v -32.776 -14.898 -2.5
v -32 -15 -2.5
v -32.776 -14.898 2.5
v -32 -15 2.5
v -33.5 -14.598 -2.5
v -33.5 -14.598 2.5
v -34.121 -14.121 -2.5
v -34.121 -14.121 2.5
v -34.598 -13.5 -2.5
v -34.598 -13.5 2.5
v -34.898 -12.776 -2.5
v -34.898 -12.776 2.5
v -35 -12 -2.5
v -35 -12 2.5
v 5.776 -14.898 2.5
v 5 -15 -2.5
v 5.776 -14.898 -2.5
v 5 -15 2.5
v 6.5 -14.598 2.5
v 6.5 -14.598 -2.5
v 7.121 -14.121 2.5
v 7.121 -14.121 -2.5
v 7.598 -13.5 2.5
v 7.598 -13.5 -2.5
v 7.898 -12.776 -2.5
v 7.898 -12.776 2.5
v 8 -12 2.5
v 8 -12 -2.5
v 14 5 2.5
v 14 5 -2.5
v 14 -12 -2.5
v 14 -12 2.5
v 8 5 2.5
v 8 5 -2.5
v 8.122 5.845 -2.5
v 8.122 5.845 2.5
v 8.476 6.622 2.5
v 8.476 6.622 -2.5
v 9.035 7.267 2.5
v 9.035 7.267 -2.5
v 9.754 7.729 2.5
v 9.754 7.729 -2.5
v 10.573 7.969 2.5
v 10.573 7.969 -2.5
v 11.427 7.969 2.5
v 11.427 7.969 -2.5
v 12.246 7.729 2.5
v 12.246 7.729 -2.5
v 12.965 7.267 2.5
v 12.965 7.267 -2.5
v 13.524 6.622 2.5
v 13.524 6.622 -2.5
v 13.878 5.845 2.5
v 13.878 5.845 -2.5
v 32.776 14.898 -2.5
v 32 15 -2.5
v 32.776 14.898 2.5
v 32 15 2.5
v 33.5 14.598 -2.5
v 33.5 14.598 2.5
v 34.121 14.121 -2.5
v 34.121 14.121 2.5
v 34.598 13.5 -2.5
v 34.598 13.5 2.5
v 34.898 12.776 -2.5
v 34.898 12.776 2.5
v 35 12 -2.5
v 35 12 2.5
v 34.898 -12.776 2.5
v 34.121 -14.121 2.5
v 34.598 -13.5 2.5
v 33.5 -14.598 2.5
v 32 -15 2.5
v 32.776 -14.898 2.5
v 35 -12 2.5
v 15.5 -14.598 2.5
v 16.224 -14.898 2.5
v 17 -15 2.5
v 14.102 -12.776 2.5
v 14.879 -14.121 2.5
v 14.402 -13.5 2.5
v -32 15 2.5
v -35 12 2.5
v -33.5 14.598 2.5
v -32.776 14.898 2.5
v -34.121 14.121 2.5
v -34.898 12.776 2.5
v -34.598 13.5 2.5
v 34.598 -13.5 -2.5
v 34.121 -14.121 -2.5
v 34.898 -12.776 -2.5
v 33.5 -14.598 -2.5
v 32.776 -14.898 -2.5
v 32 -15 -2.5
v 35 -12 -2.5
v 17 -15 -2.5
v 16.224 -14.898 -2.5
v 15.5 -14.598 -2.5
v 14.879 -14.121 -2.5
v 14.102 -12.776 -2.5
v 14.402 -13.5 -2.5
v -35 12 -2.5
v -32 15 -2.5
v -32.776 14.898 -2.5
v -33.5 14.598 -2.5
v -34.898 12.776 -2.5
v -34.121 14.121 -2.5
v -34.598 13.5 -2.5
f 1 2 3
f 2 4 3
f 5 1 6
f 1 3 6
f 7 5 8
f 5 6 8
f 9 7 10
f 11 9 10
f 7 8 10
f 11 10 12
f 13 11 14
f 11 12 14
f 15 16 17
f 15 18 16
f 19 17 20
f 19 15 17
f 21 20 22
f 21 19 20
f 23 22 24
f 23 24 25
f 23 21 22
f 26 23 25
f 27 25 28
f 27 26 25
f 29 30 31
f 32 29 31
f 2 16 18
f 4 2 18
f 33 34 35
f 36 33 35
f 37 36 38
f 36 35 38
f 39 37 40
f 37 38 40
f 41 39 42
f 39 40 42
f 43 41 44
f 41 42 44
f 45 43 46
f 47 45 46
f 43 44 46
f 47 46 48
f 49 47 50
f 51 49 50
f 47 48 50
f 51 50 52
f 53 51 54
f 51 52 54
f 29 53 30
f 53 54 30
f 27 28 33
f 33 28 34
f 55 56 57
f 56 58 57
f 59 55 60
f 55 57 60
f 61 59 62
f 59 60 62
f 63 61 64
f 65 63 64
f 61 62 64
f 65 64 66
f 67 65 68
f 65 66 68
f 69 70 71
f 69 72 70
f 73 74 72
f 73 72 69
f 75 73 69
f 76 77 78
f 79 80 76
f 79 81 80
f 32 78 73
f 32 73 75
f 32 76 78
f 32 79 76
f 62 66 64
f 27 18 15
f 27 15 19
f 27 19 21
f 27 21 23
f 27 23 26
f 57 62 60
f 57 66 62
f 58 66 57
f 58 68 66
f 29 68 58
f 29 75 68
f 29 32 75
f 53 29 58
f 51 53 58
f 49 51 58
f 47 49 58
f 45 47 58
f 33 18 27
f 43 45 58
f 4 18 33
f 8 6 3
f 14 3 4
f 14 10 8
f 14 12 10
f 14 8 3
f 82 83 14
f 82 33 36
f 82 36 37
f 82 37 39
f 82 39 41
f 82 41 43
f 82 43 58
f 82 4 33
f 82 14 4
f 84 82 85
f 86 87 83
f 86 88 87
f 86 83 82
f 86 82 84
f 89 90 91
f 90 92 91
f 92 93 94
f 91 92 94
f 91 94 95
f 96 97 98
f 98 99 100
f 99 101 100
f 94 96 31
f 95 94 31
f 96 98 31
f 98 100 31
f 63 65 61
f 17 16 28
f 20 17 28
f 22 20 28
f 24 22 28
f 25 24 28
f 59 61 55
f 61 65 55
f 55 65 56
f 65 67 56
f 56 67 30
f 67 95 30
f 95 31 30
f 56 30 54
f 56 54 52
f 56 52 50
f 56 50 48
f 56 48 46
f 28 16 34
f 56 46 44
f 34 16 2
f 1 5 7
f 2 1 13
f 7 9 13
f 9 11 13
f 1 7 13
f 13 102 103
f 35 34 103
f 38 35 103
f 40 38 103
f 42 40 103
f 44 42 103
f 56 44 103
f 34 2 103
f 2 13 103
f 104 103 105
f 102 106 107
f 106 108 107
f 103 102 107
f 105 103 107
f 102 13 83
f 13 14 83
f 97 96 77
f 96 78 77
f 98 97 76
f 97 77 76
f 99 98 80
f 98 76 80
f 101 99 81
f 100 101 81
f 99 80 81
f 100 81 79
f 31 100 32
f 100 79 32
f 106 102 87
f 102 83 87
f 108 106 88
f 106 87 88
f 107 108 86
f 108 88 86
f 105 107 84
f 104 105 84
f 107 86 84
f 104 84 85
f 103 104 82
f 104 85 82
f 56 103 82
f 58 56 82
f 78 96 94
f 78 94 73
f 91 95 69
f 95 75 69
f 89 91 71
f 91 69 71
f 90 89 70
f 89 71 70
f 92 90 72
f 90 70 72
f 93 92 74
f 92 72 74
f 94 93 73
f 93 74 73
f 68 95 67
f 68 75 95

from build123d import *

# Parameters (mm, degrees)
PLAT_W                      = 30
PLAT_H                      = 5
EL_MENT_M_CANO_SOUD_1_DEPTH = 70
ENL_V_MAT_EXTRU_1_DEPTH     = 6
CONG_1_R                    = 3


with BuildPart() as part:
    # plat → Elément mécano-soudé1 (new body)
    with BuildSketch(Plane.YZ.offset(-35)):
        Rectangle(PLAT_W, PLAT_H)
    extrude(amount=EL_MENT_M_CANO_SOUD_1_DEPTH)

    # Esquisse2 → Enlèv. mat.-Extru.1 (cut, through all)
    with BuildSketch(Plane(origin=(0, 0, -2.5), x_dir=(-1, 0, 0), z_dir=(0, 0, -1))):
        with BuildLine():
            Line((-14, -15), (-8, -15))
            Line((-8, -15), (-8, 5))
            ThreePointArc((-8, 5), (-11, 8), (-14, 5))
            Line((-14, 5), (-14, -15))
        make_face()
    extrude(amount=-ENL_V_MAT_EXTRU_1_DEPTH, mode=Mode.SUBTRACT)

    # Congé1
    cong_1_edges = [part.edges().sort_by_distance(p)[0] for p in [
        (35, 15, 0),
        (14, -15, 0),
        (8, -15, 0),
        (35, -15, 0),
        (-35, 15, 0),
        (-35, -15, 0),
    ]]
    fillet(cong_1_edges, radius=CONG_1_R)


solid = part.part
